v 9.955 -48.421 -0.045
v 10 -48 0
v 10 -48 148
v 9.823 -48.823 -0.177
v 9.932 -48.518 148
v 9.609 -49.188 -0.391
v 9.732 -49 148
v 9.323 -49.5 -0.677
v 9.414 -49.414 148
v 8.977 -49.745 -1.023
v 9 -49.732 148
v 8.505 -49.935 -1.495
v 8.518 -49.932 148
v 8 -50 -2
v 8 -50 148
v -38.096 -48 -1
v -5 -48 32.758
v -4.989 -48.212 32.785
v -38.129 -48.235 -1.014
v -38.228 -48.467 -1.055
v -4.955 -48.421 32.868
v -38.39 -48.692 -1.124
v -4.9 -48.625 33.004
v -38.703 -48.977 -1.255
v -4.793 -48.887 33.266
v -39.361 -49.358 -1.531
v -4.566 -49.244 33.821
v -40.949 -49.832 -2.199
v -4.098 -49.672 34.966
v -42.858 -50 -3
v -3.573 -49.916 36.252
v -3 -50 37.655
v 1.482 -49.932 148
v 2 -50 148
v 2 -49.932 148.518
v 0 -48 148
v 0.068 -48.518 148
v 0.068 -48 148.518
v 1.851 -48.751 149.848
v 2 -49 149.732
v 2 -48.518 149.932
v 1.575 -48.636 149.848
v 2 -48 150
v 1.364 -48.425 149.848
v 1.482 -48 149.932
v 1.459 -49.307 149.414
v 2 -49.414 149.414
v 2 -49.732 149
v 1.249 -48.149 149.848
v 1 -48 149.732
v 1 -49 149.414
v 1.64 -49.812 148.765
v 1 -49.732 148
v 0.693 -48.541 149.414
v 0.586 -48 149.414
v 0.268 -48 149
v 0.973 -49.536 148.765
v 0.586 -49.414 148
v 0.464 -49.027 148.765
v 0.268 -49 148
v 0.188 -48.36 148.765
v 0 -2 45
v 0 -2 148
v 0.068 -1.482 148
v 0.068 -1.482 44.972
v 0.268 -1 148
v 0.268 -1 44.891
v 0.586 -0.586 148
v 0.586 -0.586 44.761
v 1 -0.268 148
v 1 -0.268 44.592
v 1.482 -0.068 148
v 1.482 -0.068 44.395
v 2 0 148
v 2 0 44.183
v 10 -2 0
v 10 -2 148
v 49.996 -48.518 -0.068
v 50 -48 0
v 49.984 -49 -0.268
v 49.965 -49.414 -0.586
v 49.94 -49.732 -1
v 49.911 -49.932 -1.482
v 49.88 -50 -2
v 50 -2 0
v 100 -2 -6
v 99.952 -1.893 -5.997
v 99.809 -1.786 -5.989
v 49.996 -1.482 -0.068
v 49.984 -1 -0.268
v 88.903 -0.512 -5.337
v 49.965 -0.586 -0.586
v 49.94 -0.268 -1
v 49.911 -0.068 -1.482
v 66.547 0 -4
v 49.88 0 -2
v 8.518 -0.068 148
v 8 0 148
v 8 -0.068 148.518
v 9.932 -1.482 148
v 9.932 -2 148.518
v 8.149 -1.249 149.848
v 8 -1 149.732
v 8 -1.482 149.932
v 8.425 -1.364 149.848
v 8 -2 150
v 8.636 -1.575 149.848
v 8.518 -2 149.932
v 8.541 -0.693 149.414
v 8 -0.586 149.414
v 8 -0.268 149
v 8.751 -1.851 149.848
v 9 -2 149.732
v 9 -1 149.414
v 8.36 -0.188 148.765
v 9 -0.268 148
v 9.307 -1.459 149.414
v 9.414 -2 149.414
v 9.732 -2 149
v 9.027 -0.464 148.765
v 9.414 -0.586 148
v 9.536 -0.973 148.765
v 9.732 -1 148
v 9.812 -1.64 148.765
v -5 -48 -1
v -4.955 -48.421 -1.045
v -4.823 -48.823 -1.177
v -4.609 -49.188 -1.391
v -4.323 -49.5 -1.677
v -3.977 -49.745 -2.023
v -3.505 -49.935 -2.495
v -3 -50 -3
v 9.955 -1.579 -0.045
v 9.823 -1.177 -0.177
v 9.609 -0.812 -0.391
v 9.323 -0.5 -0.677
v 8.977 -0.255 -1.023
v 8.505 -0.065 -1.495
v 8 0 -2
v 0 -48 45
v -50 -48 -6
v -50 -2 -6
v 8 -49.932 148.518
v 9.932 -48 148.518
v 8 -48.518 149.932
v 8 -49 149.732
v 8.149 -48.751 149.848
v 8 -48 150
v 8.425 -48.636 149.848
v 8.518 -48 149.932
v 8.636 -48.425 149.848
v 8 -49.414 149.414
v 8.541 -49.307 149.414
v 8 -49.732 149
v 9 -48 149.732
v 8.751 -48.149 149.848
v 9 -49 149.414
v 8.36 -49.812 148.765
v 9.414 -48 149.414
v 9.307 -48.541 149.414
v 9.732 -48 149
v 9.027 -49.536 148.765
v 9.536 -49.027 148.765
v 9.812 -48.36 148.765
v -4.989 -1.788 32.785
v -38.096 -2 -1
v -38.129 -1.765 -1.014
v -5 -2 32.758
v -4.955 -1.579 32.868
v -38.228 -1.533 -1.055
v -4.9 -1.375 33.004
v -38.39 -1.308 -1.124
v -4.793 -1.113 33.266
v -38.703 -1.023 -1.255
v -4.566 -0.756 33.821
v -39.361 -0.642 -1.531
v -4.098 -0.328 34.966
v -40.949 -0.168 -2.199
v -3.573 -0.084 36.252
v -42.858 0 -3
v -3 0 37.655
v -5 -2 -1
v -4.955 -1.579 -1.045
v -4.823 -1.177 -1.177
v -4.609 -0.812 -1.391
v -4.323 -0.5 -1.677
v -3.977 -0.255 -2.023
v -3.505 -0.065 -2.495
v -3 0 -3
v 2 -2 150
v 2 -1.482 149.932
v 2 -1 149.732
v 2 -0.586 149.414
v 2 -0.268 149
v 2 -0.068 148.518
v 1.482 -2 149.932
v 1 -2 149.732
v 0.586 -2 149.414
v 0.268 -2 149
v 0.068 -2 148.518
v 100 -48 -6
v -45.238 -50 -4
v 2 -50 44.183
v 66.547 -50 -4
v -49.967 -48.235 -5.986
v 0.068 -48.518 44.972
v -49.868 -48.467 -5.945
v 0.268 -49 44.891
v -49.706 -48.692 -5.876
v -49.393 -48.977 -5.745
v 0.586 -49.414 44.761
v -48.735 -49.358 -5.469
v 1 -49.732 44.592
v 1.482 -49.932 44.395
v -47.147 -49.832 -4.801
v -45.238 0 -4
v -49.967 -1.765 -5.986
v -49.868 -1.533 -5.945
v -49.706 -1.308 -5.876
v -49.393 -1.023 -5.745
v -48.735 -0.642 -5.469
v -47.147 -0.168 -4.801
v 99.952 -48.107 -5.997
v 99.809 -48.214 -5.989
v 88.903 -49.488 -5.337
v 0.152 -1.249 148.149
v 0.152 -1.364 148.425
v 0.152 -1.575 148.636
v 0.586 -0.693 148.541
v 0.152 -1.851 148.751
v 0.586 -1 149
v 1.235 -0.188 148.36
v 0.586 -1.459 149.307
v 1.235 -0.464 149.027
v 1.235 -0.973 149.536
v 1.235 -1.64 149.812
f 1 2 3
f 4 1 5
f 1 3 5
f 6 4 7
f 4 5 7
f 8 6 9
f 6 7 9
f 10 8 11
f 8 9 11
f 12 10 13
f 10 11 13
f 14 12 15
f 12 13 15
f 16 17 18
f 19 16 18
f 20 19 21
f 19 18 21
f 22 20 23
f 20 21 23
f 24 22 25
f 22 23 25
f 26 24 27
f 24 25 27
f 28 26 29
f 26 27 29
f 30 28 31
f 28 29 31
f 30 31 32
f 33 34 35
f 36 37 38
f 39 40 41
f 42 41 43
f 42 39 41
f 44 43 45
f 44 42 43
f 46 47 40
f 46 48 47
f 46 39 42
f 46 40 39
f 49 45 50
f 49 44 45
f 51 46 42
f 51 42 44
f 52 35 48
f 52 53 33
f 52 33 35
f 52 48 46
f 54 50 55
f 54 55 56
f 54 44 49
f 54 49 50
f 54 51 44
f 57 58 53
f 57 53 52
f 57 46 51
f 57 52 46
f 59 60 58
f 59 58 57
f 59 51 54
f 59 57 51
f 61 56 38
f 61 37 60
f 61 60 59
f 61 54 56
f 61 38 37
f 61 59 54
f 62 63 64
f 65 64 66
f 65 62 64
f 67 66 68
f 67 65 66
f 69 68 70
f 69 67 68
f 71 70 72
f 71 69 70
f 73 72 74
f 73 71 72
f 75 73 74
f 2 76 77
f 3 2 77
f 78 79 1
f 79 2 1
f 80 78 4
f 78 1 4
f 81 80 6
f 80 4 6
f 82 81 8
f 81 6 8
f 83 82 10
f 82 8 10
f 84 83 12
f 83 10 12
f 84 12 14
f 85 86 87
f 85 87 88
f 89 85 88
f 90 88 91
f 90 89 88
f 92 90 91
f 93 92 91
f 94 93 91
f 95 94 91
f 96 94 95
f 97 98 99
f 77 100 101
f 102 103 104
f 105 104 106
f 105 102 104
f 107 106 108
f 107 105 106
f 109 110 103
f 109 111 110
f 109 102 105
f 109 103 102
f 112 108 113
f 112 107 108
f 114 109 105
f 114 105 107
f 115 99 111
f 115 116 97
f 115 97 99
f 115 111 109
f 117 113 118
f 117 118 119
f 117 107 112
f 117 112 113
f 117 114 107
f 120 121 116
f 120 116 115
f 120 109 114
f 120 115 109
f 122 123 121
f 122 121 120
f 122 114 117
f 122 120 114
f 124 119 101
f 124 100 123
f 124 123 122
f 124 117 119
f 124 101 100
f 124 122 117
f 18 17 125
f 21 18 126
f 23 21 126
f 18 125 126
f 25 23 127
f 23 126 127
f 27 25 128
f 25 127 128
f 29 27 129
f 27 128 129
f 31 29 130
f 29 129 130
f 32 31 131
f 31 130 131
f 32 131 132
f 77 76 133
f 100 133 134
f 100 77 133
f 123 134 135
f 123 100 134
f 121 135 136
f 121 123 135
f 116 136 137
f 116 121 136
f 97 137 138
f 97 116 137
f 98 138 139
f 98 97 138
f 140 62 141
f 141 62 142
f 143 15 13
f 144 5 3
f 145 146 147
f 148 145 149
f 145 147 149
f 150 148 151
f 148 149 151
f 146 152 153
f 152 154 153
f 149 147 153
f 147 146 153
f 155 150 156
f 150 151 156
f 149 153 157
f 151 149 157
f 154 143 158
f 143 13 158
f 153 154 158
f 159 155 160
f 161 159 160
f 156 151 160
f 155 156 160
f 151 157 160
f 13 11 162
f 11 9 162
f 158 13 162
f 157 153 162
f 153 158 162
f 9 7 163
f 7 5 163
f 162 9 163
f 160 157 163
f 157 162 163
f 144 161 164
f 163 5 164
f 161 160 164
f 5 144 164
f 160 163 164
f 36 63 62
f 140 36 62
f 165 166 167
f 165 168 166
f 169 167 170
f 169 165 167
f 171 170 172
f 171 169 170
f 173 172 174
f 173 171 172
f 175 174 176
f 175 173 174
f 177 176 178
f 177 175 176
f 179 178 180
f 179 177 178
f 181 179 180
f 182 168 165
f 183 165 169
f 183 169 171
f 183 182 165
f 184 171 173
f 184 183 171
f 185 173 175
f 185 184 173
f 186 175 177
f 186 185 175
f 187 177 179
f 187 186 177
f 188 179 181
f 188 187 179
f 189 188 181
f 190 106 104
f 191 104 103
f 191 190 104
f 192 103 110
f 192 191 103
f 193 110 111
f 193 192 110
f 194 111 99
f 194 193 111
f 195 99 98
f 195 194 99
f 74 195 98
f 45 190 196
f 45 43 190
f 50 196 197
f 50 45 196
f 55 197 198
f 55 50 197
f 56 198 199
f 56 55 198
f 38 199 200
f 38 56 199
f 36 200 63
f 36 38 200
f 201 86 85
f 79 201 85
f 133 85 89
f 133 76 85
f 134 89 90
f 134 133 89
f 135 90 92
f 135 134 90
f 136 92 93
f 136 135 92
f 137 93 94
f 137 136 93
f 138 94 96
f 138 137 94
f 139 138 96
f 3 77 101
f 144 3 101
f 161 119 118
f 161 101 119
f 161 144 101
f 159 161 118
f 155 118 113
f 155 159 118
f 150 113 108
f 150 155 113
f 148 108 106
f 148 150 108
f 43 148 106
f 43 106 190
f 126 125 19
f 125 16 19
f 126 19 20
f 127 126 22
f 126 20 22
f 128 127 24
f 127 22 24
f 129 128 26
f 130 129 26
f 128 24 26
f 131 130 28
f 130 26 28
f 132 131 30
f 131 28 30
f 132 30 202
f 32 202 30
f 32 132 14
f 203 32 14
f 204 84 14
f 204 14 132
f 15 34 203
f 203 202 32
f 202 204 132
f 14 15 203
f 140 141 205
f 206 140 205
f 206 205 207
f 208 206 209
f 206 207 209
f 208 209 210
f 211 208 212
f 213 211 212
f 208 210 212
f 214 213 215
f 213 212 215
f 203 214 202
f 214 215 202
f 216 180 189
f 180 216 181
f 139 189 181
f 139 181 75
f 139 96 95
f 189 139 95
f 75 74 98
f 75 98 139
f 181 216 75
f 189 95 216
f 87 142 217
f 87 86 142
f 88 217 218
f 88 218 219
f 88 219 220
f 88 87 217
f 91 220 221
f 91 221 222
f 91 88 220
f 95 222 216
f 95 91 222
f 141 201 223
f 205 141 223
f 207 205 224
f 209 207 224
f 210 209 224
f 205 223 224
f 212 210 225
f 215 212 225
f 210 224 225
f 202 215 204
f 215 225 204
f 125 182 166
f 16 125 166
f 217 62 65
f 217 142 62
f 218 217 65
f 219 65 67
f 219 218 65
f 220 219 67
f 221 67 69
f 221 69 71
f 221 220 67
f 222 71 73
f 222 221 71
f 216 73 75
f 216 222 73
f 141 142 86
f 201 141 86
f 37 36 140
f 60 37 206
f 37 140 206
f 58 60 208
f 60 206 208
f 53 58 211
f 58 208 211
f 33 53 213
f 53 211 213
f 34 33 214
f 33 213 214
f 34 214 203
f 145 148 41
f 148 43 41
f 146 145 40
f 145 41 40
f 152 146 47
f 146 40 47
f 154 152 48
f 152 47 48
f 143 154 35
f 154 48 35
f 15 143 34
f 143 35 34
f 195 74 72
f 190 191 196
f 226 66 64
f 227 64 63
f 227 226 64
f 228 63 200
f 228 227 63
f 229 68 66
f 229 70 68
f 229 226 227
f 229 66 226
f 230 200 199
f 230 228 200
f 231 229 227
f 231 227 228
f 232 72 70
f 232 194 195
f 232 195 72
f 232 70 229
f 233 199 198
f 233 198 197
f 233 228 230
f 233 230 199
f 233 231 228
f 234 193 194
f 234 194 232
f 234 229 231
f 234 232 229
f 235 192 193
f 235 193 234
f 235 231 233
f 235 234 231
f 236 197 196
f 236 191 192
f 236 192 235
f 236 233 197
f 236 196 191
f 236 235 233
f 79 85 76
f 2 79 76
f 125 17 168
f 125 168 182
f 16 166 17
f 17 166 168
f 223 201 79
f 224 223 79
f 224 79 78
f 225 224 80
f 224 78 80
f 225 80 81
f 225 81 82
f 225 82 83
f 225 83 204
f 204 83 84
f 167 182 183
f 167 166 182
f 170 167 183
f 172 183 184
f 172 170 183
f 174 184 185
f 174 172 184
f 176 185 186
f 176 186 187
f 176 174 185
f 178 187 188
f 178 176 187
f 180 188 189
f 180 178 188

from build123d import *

# Parameters (mm, degrees)
F1_DEPTH = 50
F2_R     = 2


with BuildPart() as f1:
    # F0 (on Front) → F1 (new body)
    with BuildSketch(Plane.XZ):
        Polygon((0, 45), (0, 0), (10, 0), (10, 150), (0, 150), align=None)
        Polygon((0, -6), (0, 0), (0, 45), (-50, -6), align=None)
        Polygon((-5, 32.757872), (-5, -1), (-38.095953, -1), align=None, mode=Mode.SUBTRACT)
        Polygon((10, 0), (0, 0), (0, -6), (100, -6), (50, 0), align=None)
    extrude(amount=F1_DEPTH)

    # F2
    f2_edges = [f1.edges().sort_by_distance(p)[0] for p in [
        (0, -50, 97.5),
        (-25, -50, 19.5),
        (25, -50, -6),
        (75, -50, -3),
        (30, -50, 0),
        (10, -50, 75),
        (5, -50, 150),
        (-21.547976, -50, -1),
        (-21.547976, -50, 15.878936),
        (-5, -50, 15.878936),
        (10, 0, 75),
        (5, 0, 150),
        (0, 0, 97.5),
        (-25, 0, 19.5),
        (25, 0, -6),
        (75, 0, -3),
        (30, 0, 0),
        (-21.547976, 0, -1),
        (-21.547976, 0, 15.878936),
        (-5, 0, 15.878936),
        (10, -25, 150),
        (0, -25, 150),
    ]]
    fillet(f2_edges, radius=F2_R)


solid = f1.part
